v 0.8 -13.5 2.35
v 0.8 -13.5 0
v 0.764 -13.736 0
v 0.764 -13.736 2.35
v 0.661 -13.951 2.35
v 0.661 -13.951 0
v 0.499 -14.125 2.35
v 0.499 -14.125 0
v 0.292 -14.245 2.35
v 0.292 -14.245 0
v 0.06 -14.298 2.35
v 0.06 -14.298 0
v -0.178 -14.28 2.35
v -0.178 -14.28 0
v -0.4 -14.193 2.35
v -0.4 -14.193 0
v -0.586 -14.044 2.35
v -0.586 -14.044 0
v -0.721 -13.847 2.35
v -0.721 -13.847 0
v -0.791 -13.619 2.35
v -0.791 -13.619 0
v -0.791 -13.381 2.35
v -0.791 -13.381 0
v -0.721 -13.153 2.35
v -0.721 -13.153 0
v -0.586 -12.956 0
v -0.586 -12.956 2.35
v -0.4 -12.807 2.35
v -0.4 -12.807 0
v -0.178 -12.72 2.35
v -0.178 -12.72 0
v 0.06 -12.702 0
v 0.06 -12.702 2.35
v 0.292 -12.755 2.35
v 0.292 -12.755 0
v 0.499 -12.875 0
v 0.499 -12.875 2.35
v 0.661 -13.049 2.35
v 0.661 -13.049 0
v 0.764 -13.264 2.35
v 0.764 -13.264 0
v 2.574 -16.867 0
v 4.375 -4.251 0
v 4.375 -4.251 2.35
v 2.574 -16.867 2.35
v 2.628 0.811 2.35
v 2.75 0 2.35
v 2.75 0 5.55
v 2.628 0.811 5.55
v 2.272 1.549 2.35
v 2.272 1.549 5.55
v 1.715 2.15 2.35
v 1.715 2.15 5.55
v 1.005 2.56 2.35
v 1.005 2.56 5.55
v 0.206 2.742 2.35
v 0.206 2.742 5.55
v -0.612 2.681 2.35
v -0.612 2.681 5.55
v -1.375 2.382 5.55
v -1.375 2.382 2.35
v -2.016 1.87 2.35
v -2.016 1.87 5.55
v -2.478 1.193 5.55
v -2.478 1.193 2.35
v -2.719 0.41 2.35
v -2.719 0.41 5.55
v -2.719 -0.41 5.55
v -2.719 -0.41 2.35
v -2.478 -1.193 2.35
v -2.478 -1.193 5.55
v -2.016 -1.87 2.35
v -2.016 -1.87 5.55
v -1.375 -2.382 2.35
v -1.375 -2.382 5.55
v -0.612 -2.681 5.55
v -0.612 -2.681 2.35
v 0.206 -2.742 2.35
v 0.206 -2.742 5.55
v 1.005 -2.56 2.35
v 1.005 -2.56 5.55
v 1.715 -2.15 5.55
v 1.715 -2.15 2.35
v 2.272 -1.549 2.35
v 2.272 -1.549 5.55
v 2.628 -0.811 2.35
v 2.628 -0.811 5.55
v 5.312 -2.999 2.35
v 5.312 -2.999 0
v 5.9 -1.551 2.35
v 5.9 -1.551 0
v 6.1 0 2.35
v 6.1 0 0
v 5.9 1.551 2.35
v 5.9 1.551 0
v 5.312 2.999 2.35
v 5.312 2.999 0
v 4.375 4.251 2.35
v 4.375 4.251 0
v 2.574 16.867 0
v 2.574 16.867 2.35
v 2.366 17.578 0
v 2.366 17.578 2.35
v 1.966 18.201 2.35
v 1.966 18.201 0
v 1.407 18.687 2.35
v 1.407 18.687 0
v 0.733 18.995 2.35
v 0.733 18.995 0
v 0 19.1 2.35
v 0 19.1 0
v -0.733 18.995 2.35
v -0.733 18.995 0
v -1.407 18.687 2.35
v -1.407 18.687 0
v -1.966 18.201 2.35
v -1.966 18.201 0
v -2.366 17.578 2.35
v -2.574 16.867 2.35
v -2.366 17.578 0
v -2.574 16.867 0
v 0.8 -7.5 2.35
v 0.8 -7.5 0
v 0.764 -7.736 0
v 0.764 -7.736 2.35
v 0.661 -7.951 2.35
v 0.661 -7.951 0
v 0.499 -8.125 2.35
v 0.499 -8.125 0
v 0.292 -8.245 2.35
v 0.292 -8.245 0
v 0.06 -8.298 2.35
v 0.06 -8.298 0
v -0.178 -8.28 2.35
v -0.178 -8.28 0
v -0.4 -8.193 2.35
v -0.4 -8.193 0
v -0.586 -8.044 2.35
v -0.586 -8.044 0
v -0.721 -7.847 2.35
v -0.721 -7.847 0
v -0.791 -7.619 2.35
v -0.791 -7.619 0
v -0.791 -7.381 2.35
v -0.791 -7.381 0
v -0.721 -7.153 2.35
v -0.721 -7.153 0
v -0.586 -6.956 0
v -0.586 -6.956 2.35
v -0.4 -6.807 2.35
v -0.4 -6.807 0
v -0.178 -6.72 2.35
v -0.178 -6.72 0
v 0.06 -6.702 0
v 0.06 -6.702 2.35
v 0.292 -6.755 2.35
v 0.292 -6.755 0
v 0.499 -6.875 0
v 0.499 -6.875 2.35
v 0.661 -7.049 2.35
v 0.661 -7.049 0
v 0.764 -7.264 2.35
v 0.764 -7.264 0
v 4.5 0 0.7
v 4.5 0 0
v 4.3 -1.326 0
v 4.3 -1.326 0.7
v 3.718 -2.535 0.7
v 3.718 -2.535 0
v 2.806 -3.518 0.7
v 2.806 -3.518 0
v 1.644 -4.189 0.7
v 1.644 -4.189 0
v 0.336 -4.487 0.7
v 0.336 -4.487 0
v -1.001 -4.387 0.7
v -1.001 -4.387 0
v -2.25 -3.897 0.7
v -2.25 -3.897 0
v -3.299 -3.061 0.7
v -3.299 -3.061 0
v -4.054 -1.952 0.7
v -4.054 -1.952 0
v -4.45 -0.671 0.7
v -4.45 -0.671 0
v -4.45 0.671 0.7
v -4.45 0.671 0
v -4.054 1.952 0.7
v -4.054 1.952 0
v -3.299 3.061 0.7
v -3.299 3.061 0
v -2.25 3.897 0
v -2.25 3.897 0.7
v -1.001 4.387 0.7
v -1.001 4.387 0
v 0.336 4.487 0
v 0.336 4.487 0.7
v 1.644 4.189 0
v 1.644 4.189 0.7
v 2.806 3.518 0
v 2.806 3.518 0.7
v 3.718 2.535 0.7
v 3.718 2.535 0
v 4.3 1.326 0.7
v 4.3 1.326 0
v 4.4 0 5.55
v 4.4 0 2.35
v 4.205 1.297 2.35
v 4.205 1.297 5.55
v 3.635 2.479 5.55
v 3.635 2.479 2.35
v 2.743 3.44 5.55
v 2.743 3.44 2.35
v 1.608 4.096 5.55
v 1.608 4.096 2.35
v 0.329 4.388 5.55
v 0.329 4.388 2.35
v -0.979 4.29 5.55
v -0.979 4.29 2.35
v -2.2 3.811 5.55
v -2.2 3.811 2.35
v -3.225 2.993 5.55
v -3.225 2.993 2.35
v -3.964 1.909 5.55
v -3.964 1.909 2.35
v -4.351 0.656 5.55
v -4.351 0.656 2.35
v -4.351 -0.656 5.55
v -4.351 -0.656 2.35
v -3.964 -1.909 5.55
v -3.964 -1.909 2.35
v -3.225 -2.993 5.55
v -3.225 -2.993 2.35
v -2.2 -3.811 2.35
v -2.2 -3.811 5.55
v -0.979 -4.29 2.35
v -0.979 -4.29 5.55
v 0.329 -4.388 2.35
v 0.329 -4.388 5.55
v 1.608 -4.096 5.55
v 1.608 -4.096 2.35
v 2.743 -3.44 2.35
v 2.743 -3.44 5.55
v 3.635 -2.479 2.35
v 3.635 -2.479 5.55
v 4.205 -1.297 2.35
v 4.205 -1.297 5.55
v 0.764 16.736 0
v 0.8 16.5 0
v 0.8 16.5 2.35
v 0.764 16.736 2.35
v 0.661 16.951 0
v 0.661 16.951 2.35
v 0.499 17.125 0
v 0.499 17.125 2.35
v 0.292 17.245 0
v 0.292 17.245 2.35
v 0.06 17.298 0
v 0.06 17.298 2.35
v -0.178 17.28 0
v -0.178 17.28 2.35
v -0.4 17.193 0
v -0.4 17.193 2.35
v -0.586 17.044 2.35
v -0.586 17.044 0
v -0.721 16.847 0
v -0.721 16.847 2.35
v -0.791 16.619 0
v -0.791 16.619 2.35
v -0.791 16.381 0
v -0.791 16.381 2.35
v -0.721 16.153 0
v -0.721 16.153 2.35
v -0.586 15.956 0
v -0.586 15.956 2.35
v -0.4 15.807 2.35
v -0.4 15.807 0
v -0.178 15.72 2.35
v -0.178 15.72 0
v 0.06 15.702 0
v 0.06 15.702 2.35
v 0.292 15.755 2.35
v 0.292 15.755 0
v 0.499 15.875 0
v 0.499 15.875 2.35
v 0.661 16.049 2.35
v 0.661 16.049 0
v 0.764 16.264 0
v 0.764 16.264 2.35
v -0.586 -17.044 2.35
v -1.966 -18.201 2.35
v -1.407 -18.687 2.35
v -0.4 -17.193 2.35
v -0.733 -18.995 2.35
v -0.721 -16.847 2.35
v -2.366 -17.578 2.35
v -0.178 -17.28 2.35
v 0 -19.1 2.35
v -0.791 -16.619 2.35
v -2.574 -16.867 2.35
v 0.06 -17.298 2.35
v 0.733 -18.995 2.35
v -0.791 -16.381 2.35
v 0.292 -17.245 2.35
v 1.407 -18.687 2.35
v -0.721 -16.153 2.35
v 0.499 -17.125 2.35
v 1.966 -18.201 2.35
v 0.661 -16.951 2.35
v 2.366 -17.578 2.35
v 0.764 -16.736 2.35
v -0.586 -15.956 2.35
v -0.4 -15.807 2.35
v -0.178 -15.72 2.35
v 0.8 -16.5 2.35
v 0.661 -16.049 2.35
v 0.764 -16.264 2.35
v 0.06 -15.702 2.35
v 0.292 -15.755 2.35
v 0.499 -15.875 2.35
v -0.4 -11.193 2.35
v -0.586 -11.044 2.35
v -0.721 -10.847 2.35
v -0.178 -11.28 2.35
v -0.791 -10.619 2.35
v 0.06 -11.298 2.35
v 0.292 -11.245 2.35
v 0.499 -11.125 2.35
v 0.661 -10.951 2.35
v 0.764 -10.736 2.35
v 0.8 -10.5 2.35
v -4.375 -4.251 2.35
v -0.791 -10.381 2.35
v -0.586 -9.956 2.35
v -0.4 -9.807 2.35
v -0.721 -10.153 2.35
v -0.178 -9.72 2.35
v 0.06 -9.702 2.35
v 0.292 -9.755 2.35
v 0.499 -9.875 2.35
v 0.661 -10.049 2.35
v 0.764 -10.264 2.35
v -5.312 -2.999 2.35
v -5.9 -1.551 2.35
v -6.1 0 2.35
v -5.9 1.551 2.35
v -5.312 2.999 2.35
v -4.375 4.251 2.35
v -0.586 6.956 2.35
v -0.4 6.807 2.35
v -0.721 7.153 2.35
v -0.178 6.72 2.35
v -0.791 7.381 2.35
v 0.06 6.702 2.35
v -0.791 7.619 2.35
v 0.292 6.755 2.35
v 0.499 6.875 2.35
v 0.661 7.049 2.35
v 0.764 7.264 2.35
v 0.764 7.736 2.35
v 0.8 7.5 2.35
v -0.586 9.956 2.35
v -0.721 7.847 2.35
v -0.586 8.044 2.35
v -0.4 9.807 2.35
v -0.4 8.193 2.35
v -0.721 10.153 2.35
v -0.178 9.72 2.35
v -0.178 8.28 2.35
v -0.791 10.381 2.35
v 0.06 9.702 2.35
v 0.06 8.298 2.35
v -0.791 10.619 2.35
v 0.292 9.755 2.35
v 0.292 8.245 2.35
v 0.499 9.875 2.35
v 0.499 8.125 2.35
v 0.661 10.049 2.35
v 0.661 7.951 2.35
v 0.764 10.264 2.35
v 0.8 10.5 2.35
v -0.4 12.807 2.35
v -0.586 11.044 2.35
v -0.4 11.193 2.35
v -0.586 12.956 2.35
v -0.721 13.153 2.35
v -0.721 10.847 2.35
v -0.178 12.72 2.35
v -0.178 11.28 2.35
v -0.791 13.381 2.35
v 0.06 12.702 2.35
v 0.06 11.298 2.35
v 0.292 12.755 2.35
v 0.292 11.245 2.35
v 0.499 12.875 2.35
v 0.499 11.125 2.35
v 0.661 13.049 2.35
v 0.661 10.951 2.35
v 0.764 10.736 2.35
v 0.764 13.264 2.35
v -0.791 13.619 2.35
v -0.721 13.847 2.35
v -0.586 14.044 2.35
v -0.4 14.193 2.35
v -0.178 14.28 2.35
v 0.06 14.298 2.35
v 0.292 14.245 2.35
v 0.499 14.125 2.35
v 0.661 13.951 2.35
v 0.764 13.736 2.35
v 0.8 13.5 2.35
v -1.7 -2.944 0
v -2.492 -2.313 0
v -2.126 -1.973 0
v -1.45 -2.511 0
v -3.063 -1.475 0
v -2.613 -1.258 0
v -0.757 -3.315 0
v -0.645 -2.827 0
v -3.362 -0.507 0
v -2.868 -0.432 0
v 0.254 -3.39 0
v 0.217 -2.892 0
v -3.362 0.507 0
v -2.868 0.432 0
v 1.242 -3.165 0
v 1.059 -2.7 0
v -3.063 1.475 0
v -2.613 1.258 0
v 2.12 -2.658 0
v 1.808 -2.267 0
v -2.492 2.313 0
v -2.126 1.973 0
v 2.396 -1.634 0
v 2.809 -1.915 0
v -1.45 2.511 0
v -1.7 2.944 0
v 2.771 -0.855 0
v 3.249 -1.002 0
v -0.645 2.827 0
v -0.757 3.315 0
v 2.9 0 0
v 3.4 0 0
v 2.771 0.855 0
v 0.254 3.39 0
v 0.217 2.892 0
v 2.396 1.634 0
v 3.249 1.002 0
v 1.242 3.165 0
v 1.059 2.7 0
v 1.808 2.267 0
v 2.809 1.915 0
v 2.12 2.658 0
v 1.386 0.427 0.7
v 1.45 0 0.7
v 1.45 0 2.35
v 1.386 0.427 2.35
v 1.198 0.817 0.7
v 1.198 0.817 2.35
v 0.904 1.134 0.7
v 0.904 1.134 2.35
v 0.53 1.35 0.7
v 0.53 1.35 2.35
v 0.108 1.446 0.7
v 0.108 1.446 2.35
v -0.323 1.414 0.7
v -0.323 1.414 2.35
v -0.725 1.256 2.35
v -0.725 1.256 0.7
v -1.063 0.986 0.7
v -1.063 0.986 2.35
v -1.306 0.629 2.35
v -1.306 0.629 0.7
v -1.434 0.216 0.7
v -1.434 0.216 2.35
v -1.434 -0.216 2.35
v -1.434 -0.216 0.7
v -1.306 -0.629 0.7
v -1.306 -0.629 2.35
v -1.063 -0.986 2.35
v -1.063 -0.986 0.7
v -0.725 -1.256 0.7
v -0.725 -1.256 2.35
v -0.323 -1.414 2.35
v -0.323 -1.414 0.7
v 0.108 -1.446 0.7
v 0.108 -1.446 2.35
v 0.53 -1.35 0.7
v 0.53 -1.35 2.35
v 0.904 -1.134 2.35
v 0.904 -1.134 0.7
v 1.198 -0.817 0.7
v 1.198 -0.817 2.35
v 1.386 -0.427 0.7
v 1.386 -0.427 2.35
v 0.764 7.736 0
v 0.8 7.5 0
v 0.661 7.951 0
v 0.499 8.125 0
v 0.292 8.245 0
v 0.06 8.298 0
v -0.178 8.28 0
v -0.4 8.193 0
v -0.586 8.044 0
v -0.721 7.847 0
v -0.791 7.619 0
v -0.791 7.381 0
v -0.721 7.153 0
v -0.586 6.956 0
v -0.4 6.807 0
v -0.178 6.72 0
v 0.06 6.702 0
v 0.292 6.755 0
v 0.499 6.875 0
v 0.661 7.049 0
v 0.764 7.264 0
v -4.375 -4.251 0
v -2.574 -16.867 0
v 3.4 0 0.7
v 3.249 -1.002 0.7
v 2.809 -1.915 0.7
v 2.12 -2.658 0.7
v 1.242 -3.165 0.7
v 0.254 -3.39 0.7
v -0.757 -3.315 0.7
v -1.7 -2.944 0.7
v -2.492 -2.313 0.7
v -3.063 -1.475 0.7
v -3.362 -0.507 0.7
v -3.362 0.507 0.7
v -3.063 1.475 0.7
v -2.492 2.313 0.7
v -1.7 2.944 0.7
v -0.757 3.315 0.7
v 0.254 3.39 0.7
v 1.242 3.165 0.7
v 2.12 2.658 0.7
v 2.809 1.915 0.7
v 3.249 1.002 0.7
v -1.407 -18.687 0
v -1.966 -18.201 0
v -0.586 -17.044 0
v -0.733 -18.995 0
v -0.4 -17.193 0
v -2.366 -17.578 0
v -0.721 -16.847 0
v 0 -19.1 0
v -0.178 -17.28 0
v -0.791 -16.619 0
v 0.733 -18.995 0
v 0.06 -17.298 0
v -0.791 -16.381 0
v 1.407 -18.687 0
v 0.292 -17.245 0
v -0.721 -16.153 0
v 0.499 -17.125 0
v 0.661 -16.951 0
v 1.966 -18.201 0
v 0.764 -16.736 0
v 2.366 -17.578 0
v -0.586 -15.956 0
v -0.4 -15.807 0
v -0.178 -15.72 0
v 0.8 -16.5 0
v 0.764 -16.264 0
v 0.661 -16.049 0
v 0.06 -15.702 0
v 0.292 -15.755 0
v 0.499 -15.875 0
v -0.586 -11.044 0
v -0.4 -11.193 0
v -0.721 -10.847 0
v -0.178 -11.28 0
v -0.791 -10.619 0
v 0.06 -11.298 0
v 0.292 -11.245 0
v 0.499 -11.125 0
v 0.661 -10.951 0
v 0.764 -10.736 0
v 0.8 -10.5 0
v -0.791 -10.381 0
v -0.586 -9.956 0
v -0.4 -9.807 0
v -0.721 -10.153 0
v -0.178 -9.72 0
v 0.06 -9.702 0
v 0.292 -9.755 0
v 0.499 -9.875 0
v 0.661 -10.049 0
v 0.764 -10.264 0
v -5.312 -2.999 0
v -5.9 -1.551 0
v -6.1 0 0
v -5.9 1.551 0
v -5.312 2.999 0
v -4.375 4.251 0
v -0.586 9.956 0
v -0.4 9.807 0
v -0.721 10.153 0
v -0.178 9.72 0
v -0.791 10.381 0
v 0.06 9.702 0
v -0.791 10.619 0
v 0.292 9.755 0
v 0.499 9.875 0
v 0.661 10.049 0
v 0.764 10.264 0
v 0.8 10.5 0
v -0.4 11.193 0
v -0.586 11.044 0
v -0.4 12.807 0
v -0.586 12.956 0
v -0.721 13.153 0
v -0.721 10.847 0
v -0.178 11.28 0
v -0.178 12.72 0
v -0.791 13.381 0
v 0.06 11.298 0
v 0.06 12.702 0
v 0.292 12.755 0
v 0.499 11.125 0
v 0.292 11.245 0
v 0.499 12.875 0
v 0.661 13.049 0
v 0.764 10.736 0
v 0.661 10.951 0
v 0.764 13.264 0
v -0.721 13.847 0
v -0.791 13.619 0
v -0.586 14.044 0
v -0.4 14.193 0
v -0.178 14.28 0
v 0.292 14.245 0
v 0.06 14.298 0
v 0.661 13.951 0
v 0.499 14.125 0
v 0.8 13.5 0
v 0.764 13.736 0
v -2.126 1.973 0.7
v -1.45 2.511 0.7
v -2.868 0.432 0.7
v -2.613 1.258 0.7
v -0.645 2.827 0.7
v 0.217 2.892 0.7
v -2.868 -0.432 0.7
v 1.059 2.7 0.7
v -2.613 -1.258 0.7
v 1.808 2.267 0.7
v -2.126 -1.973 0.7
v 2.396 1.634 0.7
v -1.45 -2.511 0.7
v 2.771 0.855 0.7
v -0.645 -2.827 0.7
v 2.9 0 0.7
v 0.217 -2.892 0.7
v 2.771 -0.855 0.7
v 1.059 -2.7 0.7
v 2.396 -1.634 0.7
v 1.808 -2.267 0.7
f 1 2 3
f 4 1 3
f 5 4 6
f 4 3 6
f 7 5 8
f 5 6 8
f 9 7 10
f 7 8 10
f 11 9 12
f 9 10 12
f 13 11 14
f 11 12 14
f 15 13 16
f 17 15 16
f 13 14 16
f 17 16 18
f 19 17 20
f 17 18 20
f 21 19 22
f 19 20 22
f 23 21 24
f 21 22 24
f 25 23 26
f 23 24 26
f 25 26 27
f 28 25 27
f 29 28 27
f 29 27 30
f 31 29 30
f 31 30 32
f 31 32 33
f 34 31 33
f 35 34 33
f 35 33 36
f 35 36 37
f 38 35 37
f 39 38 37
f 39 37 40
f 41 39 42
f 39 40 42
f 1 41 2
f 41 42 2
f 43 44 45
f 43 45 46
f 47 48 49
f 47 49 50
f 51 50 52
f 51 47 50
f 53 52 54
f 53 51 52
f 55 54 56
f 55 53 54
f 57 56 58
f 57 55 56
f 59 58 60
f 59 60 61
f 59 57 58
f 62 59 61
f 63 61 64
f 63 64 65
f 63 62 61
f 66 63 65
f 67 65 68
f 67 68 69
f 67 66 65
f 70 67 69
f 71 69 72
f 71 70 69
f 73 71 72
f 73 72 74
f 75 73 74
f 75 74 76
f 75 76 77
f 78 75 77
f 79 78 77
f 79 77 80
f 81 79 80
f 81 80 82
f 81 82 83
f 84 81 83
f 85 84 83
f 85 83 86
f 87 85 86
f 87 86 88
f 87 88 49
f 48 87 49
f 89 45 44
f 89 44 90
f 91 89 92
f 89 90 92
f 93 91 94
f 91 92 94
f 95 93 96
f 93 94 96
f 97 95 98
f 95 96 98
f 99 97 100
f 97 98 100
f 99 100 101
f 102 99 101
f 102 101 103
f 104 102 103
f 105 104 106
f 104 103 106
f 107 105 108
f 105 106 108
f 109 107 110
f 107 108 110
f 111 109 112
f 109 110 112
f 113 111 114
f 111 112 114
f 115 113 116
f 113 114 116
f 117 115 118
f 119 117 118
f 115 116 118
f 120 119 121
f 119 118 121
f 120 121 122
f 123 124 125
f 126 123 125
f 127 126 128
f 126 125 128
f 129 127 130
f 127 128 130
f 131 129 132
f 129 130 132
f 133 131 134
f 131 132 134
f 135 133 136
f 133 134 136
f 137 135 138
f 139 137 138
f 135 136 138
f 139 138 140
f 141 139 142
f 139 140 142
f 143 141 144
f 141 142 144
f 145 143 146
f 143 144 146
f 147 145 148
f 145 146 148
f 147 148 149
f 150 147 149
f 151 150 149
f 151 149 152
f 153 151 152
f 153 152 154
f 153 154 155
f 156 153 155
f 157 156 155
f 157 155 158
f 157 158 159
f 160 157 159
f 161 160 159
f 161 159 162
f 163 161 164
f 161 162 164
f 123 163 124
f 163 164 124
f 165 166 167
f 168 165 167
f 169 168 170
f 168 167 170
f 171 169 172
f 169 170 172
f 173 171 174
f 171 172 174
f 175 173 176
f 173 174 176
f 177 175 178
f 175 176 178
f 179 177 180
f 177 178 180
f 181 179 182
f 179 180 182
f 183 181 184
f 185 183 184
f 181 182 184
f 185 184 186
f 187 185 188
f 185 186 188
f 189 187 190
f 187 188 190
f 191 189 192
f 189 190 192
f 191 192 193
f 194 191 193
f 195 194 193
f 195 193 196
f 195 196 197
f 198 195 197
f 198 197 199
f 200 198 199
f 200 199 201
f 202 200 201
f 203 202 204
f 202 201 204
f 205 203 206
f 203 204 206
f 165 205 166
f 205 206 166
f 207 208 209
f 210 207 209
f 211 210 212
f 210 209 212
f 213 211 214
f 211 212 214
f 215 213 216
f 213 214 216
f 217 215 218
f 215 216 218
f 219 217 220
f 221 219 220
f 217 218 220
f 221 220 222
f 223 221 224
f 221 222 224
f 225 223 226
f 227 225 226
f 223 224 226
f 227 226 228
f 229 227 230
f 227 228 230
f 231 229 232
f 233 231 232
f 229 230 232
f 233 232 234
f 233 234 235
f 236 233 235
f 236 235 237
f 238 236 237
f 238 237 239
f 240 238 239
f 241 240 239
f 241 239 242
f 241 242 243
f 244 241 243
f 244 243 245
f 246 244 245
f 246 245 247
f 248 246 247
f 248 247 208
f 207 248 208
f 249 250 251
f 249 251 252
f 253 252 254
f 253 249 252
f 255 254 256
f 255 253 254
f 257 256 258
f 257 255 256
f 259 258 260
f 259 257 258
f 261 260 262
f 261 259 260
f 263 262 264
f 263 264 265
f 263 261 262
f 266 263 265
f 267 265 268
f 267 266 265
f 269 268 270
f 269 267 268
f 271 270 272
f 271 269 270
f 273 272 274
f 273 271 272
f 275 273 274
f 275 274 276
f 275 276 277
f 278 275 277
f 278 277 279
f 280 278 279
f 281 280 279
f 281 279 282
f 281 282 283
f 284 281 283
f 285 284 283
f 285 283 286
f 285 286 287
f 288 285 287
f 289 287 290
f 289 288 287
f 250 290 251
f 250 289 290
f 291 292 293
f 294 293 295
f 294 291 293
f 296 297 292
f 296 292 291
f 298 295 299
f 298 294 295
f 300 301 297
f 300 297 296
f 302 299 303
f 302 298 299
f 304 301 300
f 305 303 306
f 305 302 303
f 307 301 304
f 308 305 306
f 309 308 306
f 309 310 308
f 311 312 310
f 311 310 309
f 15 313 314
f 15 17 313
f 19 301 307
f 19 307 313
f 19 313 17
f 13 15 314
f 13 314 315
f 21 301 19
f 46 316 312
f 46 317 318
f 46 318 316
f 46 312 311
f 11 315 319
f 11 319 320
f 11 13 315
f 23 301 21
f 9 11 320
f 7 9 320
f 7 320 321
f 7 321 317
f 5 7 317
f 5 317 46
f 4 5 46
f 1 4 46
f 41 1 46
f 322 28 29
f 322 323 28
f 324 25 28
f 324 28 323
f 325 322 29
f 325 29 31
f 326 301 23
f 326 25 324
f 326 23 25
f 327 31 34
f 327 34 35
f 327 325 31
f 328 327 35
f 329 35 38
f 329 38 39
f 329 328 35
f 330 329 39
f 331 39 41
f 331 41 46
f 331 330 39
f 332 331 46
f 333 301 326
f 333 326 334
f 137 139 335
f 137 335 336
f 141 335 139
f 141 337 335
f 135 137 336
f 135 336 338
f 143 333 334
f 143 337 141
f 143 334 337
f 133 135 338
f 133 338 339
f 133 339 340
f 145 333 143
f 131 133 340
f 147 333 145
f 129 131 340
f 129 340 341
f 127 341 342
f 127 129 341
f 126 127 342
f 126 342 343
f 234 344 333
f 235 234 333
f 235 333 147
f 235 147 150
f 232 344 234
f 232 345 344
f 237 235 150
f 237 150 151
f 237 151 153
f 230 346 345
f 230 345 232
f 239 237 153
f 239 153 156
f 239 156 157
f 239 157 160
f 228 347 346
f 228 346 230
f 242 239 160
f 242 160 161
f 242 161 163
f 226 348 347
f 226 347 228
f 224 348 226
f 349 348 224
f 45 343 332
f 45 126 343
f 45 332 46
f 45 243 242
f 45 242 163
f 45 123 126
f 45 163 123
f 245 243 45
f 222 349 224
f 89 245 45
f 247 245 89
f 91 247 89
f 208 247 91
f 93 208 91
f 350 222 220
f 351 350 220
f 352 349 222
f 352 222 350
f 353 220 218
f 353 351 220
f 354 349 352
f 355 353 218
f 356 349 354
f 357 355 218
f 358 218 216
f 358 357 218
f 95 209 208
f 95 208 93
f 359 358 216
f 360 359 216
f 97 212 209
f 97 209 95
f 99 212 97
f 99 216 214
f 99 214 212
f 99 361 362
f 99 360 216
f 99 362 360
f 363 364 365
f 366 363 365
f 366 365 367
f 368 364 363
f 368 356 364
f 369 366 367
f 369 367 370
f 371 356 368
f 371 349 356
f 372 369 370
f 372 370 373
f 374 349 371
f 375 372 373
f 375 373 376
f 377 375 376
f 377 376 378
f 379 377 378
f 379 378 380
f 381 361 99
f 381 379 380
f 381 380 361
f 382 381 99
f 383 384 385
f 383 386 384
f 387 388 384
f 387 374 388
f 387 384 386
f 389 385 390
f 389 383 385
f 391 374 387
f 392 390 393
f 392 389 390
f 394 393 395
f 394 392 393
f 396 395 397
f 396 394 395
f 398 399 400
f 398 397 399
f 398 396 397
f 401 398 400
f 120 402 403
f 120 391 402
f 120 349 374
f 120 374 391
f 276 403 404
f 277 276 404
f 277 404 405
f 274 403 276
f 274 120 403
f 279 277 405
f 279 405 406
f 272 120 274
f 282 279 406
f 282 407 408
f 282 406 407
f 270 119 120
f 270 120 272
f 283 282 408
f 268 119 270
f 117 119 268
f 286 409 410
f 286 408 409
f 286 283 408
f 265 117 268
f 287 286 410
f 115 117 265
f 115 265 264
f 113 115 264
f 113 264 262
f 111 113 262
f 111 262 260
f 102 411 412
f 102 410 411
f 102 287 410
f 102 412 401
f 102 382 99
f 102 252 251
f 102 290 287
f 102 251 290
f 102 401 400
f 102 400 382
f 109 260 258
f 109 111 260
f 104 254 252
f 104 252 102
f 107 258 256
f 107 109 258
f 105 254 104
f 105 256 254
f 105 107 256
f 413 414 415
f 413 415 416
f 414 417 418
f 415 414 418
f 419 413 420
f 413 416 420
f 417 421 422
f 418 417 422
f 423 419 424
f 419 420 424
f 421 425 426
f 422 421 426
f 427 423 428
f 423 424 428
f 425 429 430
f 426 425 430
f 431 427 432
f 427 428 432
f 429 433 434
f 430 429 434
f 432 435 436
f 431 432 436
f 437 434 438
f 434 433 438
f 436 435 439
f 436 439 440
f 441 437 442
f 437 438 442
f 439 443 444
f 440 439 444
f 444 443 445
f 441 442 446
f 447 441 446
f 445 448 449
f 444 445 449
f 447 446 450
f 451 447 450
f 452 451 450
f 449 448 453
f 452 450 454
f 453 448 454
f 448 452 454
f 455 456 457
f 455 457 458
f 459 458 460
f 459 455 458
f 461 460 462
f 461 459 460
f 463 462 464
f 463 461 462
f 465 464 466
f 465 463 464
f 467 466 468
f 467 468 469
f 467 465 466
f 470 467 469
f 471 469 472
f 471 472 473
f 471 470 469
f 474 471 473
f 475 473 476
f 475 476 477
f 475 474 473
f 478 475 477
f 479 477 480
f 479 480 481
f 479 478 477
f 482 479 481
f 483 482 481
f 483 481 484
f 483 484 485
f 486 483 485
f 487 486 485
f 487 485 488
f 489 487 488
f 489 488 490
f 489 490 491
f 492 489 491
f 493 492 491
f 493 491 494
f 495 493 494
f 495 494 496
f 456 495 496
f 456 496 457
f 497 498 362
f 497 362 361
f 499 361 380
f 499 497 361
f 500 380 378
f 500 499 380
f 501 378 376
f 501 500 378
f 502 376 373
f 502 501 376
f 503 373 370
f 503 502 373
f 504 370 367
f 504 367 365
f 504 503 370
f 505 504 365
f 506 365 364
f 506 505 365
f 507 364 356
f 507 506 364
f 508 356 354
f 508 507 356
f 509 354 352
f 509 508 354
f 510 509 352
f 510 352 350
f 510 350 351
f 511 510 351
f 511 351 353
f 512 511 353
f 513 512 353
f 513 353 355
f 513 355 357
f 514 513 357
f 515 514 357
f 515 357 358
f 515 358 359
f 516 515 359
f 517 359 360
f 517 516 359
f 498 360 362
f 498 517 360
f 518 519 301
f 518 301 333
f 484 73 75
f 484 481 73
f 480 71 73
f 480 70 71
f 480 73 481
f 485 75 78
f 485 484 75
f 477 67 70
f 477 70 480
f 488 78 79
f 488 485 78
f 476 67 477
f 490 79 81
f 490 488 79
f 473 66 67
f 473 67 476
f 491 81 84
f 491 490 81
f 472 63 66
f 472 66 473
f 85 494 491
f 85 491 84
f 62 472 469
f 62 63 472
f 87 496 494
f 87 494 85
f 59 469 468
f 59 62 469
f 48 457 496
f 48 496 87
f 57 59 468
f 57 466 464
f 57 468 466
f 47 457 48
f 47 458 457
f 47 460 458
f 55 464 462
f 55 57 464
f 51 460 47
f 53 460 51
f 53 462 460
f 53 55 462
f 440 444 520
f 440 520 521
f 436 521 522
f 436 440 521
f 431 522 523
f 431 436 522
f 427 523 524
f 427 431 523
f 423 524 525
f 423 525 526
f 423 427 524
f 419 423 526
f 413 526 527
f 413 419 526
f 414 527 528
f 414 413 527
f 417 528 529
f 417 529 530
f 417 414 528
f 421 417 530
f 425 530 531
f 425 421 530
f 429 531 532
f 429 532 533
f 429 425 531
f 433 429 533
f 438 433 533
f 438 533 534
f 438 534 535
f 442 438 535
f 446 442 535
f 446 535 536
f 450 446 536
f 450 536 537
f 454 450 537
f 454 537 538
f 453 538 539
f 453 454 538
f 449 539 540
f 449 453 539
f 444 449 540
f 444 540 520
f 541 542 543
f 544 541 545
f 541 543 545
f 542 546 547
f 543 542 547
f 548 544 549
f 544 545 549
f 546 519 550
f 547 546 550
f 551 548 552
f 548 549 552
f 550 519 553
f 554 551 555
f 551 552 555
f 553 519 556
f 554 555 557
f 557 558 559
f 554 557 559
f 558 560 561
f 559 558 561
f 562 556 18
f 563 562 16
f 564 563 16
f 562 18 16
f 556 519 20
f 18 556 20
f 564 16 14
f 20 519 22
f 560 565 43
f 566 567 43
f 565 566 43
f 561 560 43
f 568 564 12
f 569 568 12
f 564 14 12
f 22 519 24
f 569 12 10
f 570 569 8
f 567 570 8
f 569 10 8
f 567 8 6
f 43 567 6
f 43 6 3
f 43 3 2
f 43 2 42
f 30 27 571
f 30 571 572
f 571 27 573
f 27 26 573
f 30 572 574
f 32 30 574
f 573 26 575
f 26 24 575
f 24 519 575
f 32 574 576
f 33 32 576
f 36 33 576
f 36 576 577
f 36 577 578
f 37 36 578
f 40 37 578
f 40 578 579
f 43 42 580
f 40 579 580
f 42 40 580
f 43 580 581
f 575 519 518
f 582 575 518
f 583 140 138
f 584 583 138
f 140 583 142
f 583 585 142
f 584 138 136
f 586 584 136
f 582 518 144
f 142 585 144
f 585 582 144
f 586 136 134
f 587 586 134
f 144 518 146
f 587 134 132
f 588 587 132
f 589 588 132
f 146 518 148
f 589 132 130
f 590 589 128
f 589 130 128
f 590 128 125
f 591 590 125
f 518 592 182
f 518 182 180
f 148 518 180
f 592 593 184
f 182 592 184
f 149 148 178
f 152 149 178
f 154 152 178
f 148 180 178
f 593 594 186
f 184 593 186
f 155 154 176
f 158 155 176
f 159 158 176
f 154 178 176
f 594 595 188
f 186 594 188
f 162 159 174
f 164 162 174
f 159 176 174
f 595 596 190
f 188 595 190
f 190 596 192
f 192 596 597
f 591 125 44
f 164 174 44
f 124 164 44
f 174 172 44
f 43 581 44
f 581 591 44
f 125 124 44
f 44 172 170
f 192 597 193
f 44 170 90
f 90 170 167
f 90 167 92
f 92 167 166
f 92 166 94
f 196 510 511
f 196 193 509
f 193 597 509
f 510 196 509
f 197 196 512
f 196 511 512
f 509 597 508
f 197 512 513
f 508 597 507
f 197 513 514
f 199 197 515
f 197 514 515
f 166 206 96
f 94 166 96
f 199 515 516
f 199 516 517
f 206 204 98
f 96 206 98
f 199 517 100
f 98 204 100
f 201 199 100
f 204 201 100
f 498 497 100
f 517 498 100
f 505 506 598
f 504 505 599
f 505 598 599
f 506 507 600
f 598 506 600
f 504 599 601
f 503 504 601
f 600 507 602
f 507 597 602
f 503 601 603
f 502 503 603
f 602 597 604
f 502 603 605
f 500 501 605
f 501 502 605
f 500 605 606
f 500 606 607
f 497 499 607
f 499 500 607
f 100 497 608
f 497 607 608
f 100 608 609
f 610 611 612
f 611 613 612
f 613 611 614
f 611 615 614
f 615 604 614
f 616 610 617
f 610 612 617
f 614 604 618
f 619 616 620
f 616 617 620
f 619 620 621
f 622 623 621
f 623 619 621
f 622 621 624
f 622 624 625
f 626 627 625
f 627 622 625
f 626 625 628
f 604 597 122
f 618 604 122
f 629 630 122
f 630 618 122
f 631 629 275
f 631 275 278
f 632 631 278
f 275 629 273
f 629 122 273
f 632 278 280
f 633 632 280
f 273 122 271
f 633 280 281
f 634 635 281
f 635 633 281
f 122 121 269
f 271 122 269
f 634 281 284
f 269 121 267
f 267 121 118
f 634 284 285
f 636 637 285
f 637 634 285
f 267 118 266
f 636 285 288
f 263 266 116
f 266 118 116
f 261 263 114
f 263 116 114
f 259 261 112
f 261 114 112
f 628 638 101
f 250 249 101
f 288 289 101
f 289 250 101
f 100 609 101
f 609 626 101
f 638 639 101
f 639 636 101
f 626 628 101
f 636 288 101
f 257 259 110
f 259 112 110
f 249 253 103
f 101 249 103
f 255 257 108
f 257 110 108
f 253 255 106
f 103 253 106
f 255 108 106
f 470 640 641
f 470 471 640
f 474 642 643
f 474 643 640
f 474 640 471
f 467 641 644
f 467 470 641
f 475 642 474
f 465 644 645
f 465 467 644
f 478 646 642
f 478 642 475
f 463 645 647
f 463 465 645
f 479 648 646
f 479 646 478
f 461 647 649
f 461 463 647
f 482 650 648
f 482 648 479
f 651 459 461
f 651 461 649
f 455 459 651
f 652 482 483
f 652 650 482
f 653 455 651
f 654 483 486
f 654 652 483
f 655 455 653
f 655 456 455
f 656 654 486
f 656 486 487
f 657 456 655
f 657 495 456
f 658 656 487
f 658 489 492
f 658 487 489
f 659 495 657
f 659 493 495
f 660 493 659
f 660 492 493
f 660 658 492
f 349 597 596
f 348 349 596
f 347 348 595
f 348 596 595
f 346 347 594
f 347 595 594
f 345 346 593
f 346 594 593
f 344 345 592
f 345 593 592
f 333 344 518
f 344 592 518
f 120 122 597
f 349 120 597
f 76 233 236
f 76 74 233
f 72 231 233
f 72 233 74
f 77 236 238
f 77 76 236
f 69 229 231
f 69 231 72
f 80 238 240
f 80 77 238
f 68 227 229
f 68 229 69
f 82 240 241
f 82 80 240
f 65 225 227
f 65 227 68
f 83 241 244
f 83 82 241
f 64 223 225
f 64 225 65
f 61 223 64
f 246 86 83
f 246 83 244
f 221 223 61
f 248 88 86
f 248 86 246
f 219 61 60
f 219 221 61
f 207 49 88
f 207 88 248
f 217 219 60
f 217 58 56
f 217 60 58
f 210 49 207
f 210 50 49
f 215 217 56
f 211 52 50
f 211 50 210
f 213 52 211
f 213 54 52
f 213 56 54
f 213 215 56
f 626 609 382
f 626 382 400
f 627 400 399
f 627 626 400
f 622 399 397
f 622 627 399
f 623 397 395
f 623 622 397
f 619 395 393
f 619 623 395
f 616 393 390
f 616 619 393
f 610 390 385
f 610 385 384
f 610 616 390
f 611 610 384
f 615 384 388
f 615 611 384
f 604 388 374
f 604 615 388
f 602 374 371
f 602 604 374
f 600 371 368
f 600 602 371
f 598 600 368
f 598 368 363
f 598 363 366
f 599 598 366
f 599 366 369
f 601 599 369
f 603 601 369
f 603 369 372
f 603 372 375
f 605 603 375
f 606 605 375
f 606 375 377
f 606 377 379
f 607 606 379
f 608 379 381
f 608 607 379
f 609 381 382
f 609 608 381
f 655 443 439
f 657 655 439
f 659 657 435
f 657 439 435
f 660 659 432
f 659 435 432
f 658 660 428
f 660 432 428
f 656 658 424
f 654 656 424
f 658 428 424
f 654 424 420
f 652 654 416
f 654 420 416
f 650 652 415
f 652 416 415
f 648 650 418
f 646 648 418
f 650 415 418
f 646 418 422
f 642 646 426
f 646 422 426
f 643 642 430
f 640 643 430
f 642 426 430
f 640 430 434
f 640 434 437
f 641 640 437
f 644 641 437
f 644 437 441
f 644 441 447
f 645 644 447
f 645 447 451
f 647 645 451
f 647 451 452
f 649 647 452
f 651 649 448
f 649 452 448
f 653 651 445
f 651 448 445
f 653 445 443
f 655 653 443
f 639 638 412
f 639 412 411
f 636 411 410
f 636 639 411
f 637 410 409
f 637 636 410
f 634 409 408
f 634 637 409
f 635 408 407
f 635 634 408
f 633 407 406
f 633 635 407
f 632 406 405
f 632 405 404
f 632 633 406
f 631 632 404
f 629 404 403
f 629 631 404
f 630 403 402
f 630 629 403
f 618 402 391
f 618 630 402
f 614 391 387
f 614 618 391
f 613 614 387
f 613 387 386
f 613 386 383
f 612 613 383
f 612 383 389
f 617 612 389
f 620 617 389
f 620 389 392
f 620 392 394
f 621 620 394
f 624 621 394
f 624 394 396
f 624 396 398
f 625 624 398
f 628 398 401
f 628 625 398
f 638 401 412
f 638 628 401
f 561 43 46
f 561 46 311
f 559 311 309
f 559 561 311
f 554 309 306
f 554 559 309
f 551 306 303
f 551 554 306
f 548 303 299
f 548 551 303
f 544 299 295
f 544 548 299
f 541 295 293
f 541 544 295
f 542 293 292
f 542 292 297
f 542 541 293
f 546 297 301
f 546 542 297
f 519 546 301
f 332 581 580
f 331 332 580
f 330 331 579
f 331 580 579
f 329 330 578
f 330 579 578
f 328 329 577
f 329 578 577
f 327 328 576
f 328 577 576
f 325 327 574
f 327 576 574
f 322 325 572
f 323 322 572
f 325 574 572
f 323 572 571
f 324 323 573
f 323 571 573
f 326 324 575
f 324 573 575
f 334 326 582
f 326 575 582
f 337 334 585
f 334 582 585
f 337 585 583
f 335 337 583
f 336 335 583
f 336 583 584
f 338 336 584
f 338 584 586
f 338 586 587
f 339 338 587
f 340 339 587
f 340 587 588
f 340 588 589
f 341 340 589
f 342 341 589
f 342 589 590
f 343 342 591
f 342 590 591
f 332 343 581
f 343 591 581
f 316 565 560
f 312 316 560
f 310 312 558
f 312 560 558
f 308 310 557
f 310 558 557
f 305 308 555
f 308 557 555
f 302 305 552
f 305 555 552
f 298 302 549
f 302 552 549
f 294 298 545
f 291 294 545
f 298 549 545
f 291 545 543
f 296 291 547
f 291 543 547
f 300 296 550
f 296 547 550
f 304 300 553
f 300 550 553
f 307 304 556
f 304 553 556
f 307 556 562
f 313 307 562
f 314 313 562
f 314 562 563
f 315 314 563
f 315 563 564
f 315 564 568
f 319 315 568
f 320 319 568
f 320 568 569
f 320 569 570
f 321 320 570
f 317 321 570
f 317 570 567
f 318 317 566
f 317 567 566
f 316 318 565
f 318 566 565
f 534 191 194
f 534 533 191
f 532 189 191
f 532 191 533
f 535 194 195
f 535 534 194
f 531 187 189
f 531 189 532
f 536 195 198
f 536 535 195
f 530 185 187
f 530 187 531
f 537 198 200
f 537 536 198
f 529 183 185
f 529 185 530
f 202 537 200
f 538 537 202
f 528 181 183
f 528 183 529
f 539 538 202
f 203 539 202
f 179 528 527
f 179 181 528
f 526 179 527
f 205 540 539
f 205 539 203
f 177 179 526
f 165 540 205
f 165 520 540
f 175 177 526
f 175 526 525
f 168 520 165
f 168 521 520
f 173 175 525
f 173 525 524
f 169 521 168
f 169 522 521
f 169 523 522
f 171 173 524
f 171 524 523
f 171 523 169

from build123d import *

# Parameters (mm, degrees)
F0_R     = 6.1
F0_R_2   = 4.4
F0_R_3   = 2.75
F0_R_4   = 1.45
F1_DEPTH = 2.35
F2_DEPTH = 5.55
F3_R     = 0.8
F4_DEPTH = 2.35
F6_R     = 4.5
F6_R_2   = 3.4
F6_R_3   = 2.9
F7_DEPTH = 0.7


# Not quite as in the source:
# - a pattern or mirror of a feature is missing from the dataset's text; its kind, count and spacing are read off the source's solid


with BuildPart() as f1:
    # F0 (on Top) → F1 (new body)
    with BuildSketch(Plane.XY):
        Circle(F0_R)
        Circle(F0_R_2, mode=Mode.SUBTRACT)
        Circle(F0_R_2)
        Circle(F0_R_3, mode=Mode.SUBTRACT)
        Circle(F0_R_3)
        Circle(F0_R_4, mode=Mode.SUBTRACT)
    extrude(amount=F1_DEPTH)

    # F0 (on Top) → F2 (join)
    with BuildSketch(Plane.XY):
        Circle(F0_R_2)
        Circle(F0_R_3, mode=Mode.SUBTRACT)
    extrude(amount=F2_DEPTH)

    # F3 (on Top) → F4 (join, through all)
    with BuildSketch(Plane.XY):
        with BuildLine():
            Line((-2.5739052597, 16.8674394022), (-4.375, 4.2508087466))
            ThreePointArc((-4.375, 4.2508087466), (0, 6.1), (4.375, 4.2508087466))
            Line((4.375, 4.2508087466), (2.5739052597, 16.8674394022))
            ThreePointArc((2.5739052597, 16.8674394022), (0, 19.1), (-2.5739052597, 16.8674394022))
        make_face()
        with Locations((0, 7.5)):
            Circle(F3_R, mode=Mode.SUBTRACT)
        with Locations((0, 10.5)):
            Circle(F3_R, mode=Mode.SUBTRACT)
        with Locations((0, 13.5)):
            Circle(F3_R, mode=Mode.SUBTRACT)
        with Locations((0, 16.5)):
            Circle(F3_R, mode=Mode.SUBTRACT)
    f4 = extrude(amount=F4_DEPTH)

    # F4_copies: F4 across plane
    add(f4.mirror(Plane(origin=(0, 0, 0), x_dir=(0, 0, -1), z_dir=(0, -1, 0))))

    # F6 (on face) → F7 (cut)
    with BuildSketch(Plane(origin=(0, 0, 0), x_dir=(1, 0, 0), z_dir=(0, 0, -1))):
        Circle(F6_R)
        Circle(F6_R_2, mode=Mode.SUBTRACT)
        Circle(F6_R_3)
    extrude(amount=-F7_DEPTH, mode=Mode.SUBTRACT)


solid = f1.part
